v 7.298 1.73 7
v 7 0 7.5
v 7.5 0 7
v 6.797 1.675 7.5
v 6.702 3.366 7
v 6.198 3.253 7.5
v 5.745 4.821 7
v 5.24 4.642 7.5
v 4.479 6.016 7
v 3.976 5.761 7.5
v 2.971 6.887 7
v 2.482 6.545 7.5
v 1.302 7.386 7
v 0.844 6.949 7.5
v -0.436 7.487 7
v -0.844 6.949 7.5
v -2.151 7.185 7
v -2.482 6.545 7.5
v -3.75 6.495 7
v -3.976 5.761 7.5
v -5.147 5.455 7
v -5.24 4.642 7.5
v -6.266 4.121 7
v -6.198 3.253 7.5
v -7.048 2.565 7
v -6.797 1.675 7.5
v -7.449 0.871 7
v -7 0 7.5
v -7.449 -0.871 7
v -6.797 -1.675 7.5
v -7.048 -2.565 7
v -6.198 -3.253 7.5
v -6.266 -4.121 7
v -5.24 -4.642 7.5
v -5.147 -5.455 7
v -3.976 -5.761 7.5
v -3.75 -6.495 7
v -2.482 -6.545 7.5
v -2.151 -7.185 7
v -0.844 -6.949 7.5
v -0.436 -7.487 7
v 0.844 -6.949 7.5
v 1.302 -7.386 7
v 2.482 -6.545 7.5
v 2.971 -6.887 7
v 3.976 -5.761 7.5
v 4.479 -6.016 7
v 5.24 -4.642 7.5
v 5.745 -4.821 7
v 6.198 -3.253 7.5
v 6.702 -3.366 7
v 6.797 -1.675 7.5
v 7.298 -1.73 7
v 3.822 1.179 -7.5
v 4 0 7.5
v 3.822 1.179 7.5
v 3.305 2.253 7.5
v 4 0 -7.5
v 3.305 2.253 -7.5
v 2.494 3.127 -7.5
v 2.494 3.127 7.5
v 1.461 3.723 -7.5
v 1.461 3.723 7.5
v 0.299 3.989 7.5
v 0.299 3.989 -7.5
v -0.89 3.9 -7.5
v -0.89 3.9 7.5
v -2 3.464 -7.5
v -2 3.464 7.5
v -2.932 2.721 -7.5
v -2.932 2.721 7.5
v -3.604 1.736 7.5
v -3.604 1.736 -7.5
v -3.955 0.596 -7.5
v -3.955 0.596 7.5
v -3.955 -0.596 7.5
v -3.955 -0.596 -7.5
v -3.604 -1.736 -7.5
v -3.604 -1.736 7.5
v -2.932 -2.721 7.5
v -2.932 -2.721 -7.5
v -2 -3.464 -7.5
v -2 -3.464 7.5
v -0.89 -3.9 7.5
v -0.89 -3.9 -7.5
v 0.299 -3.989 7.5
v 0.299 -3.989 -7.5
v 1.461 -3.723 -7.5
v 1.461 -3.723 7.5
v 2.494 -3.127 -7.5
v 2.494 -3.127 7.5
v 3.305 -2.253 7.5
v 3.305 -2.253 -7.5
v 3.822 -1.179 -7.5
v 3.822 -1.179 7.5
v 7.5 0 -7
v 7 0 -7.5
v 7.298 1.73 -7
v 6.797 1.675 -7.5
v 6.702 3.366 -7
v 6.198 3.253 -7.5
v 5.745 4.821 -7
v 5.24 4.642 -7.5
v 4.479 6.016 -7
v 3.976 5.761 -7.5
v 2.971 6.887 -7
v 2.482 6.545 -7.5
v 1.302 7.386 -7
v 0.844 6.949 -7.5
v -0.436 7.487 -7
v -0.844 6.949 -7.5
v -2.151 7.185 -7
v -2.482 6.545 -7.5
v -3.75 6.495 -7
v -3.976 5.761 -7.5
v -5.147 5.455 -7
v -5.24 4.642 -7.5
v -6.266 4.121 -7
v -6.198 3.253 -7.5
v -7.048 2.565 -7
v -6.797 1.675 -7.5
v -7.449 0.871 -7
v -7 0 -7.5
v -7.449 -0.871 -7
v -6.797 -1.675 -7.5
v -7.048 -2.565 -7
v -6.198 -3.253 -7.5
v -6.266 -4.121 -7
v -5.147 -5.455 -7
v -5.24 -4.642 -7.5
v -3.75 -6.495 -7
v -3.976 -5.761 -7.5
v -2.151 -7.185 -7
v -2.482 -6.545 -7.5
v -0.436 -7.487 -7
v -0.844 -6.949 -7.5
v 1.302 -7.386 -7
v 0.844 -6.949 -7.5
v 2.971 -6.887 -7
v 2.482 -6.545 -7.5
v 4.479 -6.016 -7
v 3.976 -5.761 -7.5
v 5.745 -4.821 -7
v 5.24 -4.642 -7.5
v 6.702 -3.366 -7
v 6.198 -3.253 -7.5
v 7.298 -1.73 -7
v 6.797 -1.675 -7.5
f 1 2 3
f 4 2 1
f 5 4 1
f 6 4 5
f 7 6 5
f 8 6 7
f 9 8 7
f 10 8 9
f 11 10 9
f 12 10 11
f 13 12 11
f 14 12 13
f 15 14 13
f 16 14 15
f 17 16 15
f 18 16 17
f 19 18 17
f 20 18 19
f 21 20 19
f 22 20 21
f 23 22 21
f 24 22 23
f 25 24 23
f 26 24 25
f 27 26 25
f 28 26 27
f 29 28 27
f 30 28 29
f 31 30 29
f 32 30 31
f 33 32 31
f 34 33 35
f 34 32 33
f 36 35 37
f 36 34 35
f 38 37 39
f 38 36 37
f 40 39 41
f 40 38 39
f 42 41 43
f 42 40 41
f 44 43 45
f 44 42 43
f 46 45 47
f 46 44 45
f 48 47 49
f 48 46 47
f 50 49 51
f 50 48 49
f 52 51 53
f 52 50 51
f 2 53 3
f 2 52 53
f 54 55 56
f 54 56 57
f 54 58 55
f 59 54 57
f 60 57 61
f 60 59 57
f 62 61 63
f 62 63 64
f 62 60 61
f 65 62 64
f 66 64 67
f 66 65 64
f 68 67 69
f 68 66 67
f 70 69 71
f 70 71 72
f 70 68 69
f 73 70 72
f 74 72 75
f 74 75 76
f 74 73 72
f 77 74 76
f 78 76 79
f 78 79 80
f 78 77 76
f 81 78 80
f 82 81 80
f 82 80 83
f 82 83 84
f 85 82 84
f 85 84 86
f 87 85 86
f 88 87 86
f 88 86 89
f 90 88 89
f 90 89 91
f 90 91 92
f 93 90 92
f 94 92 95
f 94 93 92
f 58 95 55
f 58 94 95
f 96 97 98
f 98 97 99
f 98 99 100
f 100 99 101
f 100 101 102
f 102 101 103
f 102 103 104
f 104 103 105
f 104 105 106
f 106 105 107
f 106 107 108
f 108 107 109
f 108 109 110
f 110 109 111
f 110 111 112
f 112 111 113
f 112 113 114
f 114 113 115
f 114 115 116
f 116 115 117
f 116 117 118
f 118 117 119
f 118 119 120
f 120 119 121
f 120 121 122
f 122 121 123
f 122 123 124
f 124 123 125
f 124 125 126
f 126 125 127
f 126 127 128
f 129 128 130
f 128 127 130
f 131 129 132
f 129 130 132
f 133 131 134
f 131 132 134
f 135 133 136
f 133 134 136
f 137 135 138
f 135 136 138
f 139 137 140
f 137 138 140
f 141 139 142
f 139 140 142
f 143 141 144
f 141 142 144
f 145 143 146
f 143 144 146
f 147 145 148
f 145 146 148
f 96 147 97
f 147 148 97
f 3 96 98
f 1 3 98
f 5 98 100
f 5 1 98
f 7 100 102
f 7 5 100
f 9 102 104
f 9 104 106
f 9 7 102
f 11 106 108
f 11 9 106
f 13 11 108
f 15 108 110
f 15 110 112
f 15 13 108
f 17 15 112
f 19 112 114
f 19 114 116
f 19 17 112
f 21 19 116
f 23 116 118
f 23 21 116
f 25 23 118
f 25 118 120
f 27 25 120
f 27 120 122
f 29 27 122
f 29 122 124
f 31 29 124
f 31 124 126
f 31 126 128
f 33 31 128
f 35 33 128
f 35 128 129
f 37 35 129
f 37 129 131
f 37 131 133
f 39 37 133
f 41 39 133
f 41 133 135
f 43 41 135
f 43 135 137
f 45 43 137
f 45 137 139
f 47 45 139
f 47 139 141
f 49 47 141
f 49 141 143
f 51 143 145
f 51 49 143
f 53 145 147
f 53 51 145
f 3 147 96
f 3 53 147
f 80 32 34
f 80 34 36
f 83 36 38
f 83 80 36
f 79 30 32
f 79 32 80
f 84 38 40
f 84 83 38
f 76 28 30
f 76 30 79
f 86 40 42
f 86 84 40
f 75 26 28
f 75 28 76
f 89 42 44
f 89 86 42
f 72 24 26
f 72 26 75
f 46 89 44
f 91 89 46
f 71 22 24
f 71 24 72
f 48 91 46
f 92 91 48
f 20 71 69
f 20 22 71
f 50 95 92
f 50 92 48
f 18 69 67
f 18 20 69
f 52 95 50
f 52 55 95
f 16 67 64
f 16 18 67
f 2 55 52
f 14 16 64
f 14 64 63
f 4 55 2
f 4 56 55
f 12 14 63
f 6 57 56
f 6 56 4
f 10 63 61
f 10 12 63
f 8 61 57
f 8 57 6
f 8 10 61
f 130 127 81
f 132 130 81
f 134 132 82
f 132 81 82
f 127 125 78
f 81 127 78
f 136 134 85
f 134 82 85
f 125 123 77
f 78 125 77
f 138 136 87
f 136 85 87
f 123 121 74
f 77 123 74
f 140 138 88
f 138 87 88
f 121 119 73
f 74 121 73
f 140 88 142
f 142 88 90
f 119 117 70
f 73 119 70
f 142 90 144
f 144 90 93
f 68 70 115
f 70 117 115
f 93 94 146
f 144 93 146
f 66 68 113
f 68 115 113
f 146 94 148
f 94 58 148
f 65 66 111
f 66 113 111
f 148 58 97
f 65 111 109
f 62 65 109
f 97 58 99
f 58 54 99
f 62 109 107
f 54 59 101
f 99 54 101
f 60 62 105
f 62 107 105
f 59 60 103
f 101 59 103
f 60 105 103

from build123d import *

# Parameters (mm, degrees)
SKETCH_1_R      = 7.5
SKETCH_1_R_2    = 4
EXTRUDE_1_DEPTH = 7.5
CHAMFER_1_SIZE  = 0.5
CHAMFER_2_SIZE  = 0.5


with BuildPart() as part:
    # 草图1 → 凸台-拉伸1 (new, symmetric)
    with BuildSketch(Plane.XY):
        Circle(SKETCH_1_R)
        Circle(SKETCH_1_R_2, mode=Mode.SUBTRACT)
    extrude(amount=EXTRUDE_1_DEPTH, both=True)

    # 倒角1
    chamfer_1_edges = [part.edges().sort_by_distance(p)[0] for p in [
        (-7.5, 0, -7.5),
    ]]
    chamfer(chamfer_1_edges, length=CHAMFER_1_SIZE)

    # 倒角2
    chamfer_2_edges = [part.edges().sort_by_distance(p)[0] for p in [
        (-7.5, 0, 7.5),
    ]]
    chamfer(chamfer_2_edges, length=CHAMFER_2_SIZE)


solid = part.part
